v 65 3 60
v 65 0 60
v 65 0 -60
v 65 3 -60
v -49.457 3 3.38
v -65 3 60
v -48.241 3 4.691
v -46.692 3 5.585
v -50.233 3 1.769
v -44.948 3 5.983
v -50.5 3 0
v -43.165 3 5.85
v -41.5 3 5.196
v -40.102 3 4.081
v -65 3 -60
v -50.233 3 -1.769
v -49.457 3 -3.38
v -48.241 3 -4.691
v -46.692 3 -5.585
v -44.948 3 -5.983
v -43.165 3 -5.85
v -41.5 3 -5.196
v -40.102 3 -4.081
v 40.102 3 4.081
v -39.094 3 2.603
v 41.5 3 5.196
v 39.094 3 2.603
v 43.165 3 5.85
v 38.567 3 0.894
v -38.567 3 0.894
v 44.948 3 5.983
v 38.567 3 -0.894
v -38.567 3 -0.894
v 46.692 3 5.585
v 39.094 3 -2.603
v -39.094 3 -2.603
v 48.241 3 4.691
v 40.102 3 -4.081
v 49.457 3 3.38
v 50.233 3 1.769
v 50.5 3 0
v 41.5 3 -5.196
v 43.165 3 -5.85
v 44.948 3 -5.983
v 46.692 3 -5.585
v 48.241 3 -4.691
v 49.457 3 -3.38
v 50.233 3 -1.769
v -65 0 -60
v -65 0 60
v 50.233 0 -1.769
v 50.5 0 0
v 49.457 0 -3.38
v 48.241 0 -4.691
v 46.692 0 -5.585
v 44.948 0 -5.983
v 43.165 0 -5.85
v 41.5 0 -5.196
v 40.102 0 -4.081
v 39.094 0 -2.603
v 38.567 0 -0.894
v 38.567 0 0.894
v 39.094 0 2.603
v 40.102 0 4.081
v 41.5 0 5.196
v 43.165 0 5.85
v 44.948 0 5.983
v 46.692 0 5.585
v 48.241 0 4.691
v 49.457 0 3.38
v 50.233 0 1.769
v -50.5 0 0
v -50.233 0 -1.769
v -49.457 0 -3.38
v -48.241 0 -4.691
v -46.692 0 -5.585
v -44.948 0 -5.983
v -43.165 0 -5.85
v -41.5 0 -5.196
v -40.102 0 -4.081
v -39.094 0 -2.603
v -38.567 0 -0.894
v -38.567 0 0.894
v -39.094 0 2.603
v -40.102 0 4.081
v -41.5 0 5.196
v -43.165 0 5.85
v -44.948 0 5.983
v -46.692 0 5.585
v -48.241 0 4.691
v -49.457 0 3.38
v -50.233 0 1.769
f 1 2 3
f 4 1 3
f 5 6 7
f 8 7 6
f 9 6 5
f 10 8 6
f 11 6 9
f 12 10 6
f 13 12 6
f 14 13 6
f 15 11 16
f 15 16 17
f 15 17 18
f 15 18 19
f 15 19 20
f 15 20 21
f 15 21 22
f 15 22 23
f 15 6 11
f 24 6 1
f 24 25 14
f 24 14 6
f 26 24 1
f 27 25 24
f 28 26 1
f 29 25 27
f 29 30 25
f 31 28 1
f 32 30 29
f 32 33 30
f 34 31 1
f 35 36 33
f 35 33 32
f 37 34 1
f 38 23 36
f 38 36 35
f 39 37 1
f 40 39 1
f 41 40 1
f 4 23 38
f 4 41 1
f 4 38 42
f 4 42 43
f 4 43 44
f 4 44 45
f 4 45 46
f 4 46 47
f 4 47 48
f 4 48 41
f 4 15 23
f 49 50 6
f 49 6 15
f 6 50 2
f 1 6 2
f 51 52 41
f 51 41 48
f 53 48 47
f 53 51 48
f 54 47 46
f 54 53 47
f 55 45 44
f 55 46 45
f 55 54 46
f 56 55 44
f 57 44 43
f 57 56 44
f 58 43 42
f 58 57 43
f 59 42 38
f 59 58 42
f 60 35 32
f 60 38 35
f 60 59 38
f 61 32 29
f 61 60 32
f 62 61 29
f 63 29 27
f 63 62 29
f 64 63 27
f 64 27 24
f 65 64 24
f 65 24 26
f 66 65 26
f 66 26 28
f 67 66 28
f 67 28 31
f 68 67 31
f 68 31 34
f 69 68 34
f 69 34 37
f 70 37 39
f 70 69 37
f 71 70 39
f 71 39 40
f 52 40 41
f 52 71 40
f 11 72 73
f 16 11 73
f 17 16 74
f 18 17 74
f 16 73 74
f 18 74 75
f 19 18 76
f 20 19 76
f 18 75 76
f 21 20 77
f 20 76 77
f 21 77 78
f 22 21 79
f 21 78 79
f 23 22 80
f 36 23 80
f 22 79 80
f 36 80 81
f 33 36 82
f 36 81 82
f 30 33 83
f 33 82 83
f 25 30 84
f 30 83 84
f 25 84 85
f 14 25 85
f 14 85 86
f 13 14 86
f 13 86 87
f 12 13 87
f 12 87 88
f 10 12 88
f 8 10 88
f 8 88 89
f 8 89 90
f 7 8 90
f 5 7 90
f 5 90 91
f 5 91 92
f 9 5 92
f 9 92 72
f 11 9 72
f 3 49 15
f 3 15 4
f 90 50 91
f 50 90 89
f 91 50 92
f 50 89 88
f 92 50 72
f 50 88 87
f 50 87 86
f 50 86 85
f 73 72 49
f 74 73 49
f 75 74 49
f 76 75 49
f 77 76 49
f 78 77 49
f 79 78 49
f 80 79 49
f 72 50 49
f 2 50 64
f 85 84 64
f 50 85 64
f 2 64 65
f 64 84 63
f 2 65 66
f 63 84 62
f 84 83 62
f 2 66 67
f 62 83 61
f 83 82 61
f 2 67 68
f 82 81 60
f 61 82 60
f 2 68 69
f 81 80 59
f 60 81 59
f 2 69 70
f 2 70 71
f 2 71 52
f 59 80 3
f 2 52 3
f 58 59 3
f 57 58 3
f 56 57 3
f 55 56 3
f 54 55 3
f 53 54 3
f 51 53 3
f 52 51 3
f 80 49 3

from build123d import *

# Parameters (mm, degrees)
SKETCH1_W           = 130
SKETCH1_H           = 120
BOSS_EXTRUDE1_DEPTH = 3
CUT_EXTRUDE1_START  = -4
SKETCH2_R           = 6
CUT_EXTRUDE1_DEPTH  = 5


with BuildPart() as part:
    # Sketch1 → Boss-Extrude1 (new body)
    with BuildSketch(Plane(origin=(0, 0, 0), x_dir=(1, 0, 0), z_dir=(0, 1, 0))):
        Rectangle(SKETCH1_W, SKETCH1_H)
    extrude(amount=BOSS_EXTRUDE1_DEPTH)

    # Sketch2 → Cut-Extrude1 (cut)
    with BuildSketch(Plane(origin=(0, 3, 0), x_dir=(1, 0, 0), z_dir=(0, 1, 0)).offset(CUT_EXTRUDE1_START)):
        with Locations((44.5, 0)):
            Circle(SKETCH2_R)
    cut_extrude1 = extrude(amount=CUT_EXTRUDE1_DEPTH, mode=Mode.SUBTRACT)

    # Mirror1: Cut-Extrude1 across plane
    add(cut_extrude1.mirror(Plane(origin=(0, 0, 0), x_dir=(0, 0, 1), z_dir=(1, 0, 0))), mode=Mode.SUBTRACT)


solid = part.part
